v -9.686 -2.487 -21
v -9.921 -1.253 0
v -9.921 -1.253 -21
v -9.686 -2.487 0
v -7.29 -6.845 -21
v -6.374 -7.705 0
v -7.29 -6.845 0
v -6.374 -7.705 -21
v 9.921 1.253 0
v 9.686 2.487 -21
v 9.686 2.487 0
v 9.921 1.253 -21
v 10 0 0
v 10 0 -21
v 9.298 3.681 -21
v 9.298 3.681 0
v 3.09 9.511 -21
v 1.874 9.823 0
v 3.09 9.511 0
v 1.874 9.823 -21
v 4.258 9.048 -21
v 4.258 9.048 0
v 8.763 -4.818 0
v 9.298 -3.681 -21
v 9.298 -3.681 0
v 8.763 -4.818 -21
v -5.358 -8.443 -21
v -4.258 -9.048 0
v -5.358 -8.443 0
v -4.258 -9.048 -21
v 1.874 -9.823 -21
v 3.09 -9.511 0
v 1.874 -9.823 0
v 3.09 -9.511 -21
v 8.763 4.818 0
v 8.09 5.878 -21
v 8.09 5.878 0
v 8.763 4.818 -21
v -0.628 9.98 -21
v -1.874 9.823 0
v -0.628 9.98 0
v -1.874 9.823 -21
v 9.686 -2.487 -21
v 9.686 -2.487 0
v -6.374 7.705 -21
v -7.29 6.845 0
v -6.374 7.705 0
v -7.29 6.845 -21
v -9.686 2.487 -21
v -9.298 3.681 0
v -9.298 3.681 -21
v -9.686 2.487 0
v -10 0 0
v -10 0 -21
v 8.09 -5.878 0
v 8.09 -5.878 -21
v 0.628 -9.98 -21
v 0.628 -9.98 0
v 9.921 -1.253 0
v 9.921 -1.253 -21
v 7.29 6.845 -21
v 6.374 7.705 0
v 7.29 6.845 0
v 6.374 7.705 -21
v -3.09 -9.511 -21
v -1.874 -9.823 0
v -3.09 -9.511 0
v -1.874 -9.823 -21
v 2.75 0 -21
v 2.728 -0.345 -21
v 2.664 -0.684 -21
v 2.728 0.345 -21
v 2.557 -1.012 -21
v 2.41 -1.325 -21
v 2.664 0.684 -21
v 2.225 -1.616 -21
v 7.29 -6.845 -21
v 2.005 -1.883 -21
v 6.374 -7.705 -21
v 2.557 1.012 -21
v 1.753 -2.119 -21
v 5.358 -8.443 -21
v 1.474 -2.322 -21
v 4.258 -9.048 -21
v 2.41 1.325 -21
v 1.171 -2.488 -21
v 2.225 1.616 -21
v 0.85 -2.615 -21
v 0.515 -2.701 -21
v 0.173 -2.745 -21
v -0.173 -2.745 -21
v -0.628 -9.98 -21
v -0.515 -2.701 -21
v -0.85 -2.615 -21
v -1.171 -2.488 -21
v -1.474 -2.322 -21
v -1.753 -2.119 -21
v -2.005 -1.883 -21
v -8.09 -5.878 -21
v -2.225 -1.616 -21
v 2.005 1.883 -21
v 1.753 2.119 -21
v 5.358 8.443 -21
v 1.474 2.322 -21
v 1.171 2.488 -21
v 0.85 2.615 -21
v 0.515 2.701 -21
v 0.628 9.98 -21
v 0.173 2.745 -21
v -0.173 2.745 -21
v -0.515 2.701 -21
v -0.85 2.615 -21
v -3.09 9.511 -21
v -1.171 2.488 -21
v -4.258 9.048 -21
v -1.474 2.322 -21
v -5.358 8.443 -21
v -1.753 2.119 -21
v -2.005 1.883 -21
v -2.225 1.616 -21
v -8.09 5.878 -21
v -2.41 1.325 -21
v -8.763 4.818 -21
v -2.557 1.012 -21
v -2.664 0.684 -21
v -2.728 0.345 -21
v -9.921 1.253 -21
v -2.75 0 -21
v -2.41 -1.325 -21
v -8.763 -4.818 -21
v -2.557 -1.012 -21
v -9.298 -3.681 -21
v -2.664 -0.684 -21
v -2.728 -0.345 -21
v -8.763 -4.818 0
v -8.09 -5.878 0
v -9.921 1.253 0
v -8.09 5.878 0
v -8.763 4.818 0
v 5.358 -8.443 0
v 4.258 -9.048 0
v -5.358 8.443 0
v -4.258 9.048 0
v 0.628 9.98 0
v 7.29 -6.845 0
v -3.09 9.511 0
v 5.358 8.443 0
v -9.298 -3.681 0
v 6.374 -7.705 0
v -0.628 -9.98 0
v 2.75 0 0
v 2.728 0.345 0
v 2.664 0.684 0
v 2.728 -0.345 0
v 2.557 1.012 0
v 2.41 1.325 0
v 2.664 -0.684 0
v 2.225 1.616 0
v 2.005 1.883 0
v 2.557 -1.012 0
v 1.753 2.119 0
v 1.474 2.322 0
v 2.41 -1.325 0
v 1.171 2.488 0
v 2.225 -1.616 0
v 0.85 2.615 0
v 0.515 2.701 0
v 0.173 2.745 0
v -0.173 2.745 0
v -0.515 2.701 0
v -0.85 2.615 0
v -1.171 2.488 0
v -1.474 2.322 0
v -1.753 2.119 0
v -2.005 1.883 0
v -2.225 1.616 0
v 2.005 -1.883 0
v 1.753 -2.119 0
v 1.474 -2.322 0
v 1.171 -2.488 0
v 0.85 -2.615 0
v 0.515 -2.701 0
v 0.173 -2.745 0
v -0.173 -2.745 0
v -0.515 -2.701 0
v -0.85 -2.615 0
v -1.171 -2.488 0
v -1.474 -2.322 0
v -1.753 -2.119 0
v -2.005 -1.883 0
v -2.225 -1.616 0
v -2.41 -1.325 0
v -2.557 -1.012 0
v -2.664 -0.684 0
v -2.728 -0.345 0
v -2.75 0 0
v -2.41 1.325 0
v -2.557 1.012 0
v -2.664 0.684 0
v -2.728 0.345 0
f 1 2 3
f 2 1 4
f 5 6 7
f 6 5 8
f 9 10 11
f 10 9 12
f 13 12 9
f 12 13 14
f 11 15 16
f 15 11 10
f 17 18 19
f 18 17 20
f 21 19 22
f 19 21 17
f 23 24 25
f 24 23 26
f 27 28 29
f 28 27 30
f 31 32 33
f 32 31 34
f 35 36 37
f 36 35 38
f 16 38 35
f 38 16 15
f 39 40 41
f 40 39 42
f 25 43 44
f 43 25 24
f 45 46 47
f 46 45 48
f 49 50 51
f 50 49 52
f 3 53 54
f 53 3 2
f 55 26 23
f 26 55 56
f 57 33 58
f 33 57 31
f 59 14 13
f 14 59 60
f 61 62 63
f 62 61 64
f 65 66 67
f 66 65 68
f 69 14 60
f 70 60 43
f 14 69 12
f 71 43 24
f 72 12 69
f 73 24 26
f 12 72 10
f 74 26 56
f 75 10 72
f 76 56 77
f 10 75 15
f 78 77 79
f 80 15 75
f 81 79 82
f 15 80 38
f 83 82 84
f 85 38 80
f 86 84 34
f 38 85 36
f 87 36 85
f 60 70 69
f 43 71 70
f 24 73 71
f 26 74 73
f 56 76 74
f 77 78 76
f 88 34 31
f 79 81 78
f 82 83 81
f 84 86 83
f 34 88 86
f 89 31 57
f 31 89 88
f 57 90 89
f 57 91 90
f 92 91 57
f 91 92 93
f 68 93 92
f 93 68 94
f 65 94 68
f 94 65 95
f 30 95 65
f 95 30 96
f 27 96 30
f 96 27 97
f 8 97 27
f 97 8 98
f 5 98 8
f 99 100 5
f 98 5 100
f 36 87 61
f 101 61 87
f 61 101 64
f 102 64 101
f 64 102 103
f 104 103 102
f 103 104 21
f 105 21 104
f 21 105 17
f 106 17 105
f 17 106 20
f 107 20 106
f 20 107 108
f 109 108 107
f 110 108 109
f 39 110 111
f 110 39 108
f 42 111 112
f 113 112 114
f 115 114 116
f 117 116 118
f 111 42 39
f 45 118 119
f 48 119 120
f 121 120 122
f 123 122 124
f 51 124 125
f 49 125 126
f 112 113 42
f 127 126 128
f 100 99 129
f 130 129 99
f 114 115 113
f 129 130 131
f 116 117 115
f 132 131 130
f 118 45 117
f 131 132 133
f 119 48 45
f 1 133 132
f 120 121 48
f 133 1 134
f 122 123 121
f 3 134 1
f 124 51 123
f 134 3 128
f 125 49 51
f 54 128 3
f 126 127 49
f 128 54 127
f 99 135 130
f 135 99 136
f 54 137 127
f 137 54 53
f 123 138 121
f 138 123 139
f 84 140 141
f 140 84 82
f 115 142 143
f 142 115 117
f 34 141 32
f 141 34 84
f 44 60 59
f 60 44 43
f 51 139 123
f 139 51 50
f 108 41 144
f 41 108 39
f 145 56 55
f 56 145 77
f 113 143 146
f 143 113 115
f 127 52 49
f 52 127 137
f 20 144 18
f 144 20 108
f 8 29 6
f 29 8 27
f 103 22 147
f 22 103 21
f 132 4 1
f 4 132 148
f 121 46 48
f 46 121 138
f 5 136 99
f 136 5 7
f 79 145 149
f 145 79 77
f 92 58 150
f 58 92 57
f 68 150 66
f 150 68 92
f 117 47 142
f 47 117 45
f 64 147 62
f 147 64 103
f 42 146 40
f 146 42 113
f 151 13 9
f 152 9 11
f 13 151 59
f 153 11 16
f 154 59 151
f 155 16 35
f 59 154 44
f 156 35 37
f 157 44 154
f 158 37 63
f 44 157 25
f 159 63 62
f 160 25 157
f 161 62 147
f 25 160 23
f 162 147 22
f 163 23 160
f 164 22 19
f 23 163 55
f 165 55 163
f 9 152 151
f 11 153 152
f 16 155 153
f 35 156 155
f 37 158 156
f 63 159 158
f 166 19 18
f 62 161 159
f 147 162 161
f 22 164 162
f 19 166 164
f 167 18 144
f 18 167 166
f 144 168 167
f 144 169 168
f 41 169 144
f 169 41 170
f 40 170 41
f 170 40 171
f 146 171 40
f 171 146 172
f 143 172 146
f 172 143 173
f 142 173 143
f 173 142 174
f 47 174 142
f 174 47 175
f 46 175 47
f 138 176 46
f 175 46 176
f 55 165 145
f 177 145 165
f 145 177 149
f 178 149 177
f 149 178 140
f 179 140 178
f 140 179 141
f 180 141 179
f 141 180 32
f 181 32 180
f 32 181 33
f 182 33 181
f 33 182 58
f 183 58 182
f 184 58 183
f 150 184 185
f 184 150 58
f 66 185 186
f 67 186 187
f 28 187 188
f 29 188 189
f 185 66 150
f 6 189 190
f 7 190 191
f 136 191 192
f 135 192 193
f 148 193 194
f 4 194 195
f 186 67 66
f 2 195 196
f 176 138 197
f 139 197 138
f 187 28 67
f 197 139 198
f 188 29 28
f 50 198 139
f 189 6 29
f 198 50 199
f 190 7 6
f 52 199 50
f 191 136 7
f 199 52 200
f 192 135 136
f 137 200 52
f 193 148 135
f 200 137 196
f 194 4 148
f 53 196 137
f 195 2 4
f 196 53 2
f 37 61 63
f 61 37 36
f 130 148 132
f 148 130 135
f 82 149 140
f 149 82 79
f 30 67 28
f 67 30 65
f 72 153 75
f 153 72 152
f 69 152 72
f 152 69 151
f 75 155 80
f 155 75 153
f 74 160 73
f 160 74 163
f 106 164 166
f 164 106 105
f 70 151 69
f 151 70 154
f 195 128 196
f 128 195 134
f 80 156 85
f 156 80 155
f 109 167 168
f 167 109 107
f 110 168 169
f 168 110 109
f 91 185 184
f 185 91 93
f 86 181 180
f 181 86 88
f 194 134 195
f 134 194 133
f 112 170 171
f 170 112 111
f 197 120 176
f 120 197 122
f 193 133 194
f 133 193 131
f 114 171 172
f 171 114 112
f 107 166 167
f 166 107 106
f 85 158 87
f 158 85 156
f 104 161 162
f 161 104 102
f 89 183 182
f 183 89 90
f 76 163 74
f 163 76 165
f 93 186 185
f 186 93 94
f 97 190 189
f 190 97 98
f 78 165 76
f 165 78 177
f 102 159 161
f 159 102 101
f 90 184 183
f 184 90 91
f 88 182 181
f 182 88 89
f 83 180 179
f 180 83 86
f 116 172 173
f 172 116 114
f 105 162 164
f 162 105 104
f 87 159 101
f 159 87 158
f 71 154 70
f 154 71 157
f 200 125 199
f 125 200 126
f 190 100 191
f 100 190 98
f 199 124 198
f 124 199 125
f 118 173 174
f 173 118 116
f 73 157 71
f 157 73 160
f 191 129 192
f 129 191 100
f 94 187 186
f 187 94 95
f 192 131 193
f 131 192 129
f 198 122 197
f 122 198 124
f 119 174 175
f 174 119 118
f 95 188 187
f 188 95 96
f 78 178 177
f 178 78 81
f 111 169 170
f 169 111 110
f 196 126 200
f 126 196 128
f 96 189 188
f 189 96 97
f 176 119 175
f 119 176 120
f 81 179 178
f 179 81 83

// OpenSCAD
$fn = 50;


difference() {
	union() {
		translate(v = [0, 0, -21.0000000000]) {
			cylinder(h = 21, r = 10.0000000000);
		}
		cylinder(h = 0, r = 20.0000000000);
	}
	union() {
		#translate(v = [0, 0, -21]) {
			cylinder(h = 21, r = 2.7500000000);
		}
	}
}
